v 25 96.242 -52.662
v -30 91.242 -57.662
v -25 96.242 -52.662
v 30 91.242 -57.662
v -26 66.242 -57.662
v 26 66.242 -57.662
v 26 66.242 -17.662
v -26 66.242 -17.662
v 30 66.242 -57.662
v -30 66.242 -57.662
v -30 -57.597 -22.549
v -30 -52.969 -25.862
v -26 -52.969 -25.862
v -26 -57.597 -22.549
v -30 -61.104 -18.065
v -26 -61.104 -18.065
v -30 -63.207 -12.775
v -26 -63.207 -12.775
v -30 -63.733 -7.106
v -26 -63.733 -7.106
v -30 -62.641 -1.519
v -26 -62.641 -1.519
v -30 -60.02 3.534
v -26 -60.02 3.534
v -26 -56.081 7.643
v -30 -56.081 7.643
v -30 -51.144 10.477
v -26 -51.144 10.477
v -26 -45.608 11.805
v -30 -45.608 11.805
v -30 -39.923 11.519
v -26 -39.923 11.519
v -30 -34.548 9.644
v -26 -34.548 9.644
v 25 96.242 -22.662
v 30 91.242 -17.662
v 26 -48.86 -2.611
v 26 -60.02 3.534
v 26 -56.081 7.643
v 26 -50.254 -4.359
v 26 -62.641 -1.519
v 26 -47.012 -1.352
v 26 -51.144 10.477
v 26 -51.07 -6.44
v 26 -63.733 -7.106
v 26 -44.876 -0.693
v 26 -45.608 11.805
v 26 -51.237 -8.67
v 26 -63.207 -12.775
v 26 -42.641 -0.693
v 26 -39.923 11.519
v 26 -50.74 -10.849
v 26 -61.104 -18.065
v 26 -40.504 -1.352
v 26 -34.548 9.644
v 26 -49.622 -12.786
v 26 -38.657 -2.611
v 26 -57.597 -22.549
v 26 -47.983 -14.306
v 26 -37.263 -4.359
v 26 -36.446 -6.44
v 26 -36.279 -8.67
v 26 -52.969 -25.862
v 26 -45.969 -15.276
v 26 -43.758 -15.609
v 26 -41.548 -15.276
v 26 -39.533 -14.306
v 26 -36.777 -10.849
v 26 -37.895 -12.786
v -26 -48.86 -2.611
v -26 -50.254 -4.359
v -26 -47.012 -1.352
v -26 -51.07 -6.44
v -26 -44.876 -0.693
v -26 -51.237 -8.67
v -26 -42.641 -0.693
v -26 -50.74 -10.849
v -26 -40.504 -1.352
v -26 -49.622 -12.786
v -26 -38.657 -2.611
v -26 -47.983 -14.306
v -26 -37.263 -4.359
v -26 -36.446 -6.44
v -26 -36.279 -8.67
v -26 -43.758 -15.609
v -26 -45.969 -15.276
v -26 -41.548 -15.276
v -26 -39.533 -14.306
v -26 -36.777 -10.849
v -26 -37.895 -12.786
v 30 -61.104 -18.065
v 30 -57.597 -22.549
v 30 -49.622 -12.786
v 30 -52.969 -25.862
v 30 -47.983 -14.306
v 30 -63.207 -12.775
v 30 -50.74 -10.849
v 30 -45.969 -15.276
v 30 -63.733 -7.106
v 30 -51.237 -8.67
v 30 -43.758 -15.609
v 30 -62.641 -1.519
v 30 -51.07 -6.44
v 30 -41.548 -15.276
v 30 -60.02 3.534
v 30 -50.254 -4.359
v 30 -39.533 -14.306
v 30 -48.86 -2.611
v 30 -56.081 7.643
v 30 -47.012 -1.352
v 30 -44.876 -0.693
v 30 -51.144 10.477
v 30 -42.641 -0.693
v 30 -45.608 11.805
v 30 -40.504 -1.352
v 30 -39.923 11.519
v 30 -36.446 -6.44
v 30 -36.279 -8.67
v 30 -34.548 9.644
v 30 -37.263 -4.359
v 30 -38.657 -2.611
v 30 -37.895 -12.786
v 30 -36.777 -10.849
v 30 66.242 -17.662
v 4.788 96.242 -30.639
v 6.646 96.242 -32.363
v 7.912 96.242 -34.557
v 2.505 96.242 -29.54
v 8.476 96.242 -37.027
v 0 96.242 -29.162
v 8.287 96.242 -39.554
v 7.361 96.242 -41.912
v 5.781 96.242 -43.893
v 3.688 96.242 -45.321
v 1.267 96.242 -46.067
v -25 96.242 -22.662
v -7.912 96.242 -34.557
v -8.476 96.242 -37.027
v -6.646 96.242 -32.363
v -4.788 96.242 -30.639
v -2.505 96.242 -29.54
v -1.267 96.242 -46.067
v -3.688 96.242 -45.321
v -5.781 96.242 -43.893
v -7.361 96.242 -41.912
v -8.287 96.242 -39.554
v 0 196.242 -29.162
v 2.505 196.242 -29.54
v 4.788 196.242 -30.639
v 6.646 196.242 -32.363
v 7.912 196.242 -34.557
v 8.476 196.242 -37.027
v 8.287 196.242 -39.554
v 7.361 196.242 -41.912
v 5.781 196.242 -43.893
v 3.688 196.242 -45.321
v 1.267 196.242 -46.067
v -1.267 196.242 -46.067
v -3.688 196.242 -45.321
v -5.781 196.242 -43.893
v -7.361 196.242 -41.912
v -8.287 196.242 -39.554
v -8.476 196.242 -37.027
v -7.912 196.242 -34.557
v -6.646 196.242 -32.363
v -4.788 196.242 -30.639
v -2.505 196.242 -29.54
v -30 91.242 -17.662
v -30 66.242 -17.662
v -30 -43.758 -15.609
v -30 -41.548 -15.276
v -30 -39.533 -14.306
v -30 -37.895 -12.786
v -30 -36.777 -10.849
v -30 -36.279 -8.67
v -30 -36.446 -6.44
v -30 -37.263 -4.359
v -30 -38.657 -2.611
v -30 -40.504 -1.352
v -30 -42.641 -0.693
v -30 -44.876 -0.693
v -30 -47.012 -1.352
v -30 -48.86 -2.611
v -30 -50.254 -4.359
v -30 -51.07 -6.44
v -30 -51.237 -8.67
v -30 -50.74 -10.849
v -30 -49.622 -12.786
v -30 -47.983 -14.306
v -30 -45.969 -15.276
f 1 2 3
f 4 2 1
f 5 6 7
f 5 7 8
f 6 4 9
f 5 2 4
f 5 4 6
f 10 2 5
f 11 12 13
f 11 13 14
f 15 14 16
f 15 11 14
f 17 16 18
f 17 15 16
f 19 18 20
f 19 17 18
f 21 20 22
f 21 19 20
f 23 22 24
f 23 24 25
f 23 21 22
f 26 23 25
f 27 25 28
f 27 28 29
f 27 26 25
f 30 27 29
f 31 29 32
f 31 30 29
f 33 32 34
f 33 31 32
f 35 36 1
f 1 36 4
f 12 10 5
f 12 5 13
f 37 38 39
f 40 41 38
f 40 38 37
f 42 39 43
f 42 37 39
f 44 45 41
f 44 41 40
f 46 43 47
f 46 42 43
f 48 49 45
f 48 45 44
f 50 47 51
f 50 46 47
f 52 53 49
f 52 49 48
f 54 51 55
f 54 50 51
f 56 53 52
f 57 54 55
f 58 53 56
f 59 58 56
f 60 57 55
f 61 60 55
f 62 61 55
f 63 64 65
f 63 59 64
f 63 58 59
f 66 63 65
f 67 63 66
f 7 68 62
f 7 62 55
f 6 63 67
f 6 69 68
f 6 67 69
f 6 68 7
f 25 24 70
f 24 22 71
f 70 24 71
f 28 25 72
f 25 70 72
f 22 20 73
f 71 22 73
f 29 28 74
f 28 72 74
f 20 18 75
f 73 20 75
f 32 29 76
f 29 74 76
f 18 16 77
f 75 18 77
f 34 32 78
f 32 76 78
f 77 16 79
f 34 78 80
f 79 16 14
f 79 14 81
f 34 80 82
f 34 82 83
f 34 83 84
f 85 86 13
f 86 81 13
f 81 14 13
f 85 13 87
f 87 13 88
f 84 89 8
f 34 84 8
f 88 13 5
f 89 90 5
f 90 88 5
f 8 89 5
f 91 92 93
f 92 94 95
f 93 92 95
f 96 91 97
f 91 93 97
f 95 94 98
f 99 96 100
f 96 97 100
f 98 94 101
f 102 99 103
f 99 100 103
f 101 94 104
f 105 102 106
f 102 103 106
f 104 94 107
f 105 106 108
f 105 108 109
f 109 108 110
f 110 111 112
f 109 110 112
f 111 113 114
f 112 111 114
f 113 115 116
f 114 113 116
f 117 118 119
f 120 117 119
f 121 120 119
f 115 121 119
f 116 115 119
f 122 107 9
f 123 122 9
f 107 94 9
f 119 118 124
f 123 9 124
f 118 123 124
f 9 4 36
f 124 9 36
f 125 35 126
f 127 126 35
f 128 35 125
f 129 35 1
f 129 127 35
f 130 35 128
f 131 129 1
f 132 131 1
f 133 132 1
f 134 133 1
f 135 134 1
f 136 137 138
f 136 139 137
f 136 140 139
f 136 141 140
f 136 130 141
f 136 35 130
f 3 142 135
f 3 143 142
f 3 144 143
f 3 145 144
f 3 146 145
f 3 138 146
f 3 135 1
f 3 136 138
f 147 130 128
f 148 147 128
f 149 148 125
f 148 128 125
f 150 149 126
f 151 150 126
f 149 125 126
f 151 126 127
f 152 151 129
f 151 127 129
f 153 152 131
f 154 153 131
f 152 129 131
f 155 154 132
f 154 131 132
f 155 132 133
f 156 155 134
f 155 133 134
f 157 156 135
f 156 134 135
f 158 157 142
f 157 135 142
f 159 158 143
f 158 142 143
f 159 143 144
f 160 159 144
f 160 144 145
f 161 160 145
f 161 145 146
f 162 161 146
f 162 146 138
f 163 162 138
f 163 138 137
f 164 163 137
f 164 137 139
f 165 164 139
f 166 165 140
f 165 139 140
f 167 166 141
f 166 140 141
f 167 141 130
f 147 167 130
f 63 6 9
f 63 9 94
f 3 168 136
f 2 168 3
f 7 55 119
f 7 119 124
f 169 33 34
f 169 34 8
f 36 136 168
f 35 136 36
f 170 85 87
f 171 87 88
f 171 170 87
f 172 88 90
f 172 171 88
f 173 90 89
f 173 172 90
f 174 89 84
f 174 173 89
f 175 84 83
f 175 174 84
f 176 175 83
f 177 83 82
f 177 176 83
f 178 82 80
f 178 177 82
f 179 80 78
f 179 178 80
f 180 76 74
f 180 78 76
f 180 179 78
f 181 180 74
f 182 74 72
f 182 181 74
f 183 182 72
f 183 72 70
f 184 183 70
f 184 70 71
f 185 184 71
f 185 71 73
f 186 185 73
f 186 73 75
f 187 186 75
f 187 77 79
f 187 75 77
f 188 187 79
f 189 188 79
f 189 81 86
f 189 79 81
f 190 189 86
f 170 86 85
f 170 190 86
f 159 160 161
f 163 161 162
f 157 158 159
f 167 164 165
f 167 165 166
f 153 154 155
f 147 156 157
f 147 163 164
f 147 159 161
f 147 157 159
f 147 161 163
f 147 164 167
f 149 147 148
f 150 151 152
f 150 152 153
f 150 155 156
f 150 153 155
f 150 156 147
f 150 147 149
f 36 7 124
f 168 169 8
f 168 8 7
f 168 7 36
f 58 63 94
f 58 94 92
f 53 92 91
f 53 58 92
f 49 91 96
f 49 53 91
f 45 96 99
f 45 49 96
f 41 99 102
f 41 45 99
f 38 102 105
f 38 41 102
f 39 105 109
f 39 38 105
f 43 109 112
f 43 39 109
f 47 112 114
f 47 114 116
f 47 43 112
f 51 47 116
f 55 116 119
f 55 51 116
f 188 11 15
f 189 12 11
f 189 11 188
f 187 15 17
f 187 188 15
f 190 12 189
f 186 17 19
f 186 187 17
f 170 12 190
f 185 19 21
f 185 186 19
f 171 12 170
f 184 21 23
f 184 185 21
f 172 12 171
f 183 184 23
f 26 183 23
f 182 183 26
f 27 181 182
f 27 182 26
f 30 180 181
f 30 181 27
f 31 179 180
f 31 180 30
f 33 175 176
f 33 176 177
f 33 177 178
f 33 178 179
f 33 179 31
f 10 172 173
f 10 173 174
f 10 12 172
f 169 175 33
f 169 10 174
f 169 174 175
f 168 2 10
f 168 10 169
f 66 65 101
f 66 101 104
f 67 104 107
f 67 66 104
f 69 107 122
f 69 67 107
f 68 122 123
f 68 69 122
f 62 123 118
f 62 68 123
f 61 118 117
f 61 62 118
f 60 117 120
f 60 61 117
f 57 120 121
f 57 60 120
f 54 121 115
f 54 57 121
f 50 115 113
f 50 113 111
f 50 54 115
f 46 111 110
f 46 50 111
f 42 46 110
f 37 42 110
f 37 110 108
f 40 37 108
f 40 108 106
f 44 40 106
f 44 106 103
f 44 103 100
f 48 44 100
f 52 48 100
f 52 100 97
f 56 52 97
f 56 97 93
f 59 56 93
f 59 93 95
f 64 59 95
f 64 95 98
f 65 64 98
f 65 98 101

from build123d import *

# Parameters (mm, degrees)
RESSALTO_EXTRUS_O1_DEPTH      = 30
RESSALTO_EXTRUS_O1_DEPTH_BACK = 30
ESBO_O1_R                     = 7.5
ESBO_O2_W                     = 52
ESBO_O2_H                     = 143.285030211
CORTE_EXTRUS_O1_DEPTH         = 123.474851541
CHANFRO1_SIZE                 = 5
ESBO_O3_R                     = 8.5
RESSALTO_EXTRUS_O2_DEPTH      = 100


with BuildPart() as part:
    # Esboço1 → Ressalto-extrusão1 (new, two sides: drawn at the far end of the back side and taken through both)
    with BuildSketch(Plane(origin=(0, 0, 0), x_dir=(0, 0, -1), z_dir=(1, 0, 0)).offset(-RESSALTO_EXTRUS_O1_DEPTH_BACK)):
        with BuildLine():
            Line((17.662425064, 66.241666463), (17.662425064, 96.241666463))
            Line((17.662425064, 96.241666463), (57.662425064, 96.241666463))
            Line((57.662425064, 96.241666463), (57.662425064, 66.241666463))
            Line((57.662425064, 66.241666463), (25.862440111, -52.968524997))
            ThreePointArc((25.862440111, -52.968524997), (-1.100846101, -61.511428289), (-9.643749393, -34.548142078))
            Line((-9.643749393, -34.548142078), (17.662425064, 66.241666463))
        make_face()
        with Locations((8.109345359, -43.758333537)):
            Circle(ESBO_O1_R, mode=Mode.SUBTRACT)
    extrude(amount=RESSALTO_EXTRUS_O1_DEPTH + RESSALTO_EXTRUS_O1_DEPTH_BACK)

    # Esboço2 → Corte-extrusão1 (cut, through all)
    with BuildSketch(Plane(origin=(0, 0, -57.662425064), x_dir=(-1, 0, 0), z_dir=(0, 0, -1))):
        with Locations((0, -5.400848643)):
            Rectangle(ESBO_O2_W, ESBO_O2_H)
    extrude(amount=-CORTE_EXTRUS_O1_DEPTH, mode=Mode.SUBTRACT)

    # Chanfro1
    chanfro1_edges = [part.edges().sort_by_distance(p)[0] for p in [
        (0, 96.241666463, -17.662425064),
        (-30, 96.241666463, -37.662425064),
        (30, 96.241666463, -37.662425064),
        (0, 96.241666463, -57.662425064),
    ]]
    chamfer(chanfro1_edges, length=CHANFRO1_SIZE)

    # Esboço3 → Ressalto-extrusão2 (add)
    with BuildSketch(Plane(origin=(0, 96.241666463, 0), x_dir=(1, 0, 0), z_dir=(0, 1, 0))):
        with Locations((0, 37.662425064)):
            Circle(ESBO_O3_R)
    extrude(amount=RESSALTO_EXTRUS_O2_DEPTH)


solid = part.part
